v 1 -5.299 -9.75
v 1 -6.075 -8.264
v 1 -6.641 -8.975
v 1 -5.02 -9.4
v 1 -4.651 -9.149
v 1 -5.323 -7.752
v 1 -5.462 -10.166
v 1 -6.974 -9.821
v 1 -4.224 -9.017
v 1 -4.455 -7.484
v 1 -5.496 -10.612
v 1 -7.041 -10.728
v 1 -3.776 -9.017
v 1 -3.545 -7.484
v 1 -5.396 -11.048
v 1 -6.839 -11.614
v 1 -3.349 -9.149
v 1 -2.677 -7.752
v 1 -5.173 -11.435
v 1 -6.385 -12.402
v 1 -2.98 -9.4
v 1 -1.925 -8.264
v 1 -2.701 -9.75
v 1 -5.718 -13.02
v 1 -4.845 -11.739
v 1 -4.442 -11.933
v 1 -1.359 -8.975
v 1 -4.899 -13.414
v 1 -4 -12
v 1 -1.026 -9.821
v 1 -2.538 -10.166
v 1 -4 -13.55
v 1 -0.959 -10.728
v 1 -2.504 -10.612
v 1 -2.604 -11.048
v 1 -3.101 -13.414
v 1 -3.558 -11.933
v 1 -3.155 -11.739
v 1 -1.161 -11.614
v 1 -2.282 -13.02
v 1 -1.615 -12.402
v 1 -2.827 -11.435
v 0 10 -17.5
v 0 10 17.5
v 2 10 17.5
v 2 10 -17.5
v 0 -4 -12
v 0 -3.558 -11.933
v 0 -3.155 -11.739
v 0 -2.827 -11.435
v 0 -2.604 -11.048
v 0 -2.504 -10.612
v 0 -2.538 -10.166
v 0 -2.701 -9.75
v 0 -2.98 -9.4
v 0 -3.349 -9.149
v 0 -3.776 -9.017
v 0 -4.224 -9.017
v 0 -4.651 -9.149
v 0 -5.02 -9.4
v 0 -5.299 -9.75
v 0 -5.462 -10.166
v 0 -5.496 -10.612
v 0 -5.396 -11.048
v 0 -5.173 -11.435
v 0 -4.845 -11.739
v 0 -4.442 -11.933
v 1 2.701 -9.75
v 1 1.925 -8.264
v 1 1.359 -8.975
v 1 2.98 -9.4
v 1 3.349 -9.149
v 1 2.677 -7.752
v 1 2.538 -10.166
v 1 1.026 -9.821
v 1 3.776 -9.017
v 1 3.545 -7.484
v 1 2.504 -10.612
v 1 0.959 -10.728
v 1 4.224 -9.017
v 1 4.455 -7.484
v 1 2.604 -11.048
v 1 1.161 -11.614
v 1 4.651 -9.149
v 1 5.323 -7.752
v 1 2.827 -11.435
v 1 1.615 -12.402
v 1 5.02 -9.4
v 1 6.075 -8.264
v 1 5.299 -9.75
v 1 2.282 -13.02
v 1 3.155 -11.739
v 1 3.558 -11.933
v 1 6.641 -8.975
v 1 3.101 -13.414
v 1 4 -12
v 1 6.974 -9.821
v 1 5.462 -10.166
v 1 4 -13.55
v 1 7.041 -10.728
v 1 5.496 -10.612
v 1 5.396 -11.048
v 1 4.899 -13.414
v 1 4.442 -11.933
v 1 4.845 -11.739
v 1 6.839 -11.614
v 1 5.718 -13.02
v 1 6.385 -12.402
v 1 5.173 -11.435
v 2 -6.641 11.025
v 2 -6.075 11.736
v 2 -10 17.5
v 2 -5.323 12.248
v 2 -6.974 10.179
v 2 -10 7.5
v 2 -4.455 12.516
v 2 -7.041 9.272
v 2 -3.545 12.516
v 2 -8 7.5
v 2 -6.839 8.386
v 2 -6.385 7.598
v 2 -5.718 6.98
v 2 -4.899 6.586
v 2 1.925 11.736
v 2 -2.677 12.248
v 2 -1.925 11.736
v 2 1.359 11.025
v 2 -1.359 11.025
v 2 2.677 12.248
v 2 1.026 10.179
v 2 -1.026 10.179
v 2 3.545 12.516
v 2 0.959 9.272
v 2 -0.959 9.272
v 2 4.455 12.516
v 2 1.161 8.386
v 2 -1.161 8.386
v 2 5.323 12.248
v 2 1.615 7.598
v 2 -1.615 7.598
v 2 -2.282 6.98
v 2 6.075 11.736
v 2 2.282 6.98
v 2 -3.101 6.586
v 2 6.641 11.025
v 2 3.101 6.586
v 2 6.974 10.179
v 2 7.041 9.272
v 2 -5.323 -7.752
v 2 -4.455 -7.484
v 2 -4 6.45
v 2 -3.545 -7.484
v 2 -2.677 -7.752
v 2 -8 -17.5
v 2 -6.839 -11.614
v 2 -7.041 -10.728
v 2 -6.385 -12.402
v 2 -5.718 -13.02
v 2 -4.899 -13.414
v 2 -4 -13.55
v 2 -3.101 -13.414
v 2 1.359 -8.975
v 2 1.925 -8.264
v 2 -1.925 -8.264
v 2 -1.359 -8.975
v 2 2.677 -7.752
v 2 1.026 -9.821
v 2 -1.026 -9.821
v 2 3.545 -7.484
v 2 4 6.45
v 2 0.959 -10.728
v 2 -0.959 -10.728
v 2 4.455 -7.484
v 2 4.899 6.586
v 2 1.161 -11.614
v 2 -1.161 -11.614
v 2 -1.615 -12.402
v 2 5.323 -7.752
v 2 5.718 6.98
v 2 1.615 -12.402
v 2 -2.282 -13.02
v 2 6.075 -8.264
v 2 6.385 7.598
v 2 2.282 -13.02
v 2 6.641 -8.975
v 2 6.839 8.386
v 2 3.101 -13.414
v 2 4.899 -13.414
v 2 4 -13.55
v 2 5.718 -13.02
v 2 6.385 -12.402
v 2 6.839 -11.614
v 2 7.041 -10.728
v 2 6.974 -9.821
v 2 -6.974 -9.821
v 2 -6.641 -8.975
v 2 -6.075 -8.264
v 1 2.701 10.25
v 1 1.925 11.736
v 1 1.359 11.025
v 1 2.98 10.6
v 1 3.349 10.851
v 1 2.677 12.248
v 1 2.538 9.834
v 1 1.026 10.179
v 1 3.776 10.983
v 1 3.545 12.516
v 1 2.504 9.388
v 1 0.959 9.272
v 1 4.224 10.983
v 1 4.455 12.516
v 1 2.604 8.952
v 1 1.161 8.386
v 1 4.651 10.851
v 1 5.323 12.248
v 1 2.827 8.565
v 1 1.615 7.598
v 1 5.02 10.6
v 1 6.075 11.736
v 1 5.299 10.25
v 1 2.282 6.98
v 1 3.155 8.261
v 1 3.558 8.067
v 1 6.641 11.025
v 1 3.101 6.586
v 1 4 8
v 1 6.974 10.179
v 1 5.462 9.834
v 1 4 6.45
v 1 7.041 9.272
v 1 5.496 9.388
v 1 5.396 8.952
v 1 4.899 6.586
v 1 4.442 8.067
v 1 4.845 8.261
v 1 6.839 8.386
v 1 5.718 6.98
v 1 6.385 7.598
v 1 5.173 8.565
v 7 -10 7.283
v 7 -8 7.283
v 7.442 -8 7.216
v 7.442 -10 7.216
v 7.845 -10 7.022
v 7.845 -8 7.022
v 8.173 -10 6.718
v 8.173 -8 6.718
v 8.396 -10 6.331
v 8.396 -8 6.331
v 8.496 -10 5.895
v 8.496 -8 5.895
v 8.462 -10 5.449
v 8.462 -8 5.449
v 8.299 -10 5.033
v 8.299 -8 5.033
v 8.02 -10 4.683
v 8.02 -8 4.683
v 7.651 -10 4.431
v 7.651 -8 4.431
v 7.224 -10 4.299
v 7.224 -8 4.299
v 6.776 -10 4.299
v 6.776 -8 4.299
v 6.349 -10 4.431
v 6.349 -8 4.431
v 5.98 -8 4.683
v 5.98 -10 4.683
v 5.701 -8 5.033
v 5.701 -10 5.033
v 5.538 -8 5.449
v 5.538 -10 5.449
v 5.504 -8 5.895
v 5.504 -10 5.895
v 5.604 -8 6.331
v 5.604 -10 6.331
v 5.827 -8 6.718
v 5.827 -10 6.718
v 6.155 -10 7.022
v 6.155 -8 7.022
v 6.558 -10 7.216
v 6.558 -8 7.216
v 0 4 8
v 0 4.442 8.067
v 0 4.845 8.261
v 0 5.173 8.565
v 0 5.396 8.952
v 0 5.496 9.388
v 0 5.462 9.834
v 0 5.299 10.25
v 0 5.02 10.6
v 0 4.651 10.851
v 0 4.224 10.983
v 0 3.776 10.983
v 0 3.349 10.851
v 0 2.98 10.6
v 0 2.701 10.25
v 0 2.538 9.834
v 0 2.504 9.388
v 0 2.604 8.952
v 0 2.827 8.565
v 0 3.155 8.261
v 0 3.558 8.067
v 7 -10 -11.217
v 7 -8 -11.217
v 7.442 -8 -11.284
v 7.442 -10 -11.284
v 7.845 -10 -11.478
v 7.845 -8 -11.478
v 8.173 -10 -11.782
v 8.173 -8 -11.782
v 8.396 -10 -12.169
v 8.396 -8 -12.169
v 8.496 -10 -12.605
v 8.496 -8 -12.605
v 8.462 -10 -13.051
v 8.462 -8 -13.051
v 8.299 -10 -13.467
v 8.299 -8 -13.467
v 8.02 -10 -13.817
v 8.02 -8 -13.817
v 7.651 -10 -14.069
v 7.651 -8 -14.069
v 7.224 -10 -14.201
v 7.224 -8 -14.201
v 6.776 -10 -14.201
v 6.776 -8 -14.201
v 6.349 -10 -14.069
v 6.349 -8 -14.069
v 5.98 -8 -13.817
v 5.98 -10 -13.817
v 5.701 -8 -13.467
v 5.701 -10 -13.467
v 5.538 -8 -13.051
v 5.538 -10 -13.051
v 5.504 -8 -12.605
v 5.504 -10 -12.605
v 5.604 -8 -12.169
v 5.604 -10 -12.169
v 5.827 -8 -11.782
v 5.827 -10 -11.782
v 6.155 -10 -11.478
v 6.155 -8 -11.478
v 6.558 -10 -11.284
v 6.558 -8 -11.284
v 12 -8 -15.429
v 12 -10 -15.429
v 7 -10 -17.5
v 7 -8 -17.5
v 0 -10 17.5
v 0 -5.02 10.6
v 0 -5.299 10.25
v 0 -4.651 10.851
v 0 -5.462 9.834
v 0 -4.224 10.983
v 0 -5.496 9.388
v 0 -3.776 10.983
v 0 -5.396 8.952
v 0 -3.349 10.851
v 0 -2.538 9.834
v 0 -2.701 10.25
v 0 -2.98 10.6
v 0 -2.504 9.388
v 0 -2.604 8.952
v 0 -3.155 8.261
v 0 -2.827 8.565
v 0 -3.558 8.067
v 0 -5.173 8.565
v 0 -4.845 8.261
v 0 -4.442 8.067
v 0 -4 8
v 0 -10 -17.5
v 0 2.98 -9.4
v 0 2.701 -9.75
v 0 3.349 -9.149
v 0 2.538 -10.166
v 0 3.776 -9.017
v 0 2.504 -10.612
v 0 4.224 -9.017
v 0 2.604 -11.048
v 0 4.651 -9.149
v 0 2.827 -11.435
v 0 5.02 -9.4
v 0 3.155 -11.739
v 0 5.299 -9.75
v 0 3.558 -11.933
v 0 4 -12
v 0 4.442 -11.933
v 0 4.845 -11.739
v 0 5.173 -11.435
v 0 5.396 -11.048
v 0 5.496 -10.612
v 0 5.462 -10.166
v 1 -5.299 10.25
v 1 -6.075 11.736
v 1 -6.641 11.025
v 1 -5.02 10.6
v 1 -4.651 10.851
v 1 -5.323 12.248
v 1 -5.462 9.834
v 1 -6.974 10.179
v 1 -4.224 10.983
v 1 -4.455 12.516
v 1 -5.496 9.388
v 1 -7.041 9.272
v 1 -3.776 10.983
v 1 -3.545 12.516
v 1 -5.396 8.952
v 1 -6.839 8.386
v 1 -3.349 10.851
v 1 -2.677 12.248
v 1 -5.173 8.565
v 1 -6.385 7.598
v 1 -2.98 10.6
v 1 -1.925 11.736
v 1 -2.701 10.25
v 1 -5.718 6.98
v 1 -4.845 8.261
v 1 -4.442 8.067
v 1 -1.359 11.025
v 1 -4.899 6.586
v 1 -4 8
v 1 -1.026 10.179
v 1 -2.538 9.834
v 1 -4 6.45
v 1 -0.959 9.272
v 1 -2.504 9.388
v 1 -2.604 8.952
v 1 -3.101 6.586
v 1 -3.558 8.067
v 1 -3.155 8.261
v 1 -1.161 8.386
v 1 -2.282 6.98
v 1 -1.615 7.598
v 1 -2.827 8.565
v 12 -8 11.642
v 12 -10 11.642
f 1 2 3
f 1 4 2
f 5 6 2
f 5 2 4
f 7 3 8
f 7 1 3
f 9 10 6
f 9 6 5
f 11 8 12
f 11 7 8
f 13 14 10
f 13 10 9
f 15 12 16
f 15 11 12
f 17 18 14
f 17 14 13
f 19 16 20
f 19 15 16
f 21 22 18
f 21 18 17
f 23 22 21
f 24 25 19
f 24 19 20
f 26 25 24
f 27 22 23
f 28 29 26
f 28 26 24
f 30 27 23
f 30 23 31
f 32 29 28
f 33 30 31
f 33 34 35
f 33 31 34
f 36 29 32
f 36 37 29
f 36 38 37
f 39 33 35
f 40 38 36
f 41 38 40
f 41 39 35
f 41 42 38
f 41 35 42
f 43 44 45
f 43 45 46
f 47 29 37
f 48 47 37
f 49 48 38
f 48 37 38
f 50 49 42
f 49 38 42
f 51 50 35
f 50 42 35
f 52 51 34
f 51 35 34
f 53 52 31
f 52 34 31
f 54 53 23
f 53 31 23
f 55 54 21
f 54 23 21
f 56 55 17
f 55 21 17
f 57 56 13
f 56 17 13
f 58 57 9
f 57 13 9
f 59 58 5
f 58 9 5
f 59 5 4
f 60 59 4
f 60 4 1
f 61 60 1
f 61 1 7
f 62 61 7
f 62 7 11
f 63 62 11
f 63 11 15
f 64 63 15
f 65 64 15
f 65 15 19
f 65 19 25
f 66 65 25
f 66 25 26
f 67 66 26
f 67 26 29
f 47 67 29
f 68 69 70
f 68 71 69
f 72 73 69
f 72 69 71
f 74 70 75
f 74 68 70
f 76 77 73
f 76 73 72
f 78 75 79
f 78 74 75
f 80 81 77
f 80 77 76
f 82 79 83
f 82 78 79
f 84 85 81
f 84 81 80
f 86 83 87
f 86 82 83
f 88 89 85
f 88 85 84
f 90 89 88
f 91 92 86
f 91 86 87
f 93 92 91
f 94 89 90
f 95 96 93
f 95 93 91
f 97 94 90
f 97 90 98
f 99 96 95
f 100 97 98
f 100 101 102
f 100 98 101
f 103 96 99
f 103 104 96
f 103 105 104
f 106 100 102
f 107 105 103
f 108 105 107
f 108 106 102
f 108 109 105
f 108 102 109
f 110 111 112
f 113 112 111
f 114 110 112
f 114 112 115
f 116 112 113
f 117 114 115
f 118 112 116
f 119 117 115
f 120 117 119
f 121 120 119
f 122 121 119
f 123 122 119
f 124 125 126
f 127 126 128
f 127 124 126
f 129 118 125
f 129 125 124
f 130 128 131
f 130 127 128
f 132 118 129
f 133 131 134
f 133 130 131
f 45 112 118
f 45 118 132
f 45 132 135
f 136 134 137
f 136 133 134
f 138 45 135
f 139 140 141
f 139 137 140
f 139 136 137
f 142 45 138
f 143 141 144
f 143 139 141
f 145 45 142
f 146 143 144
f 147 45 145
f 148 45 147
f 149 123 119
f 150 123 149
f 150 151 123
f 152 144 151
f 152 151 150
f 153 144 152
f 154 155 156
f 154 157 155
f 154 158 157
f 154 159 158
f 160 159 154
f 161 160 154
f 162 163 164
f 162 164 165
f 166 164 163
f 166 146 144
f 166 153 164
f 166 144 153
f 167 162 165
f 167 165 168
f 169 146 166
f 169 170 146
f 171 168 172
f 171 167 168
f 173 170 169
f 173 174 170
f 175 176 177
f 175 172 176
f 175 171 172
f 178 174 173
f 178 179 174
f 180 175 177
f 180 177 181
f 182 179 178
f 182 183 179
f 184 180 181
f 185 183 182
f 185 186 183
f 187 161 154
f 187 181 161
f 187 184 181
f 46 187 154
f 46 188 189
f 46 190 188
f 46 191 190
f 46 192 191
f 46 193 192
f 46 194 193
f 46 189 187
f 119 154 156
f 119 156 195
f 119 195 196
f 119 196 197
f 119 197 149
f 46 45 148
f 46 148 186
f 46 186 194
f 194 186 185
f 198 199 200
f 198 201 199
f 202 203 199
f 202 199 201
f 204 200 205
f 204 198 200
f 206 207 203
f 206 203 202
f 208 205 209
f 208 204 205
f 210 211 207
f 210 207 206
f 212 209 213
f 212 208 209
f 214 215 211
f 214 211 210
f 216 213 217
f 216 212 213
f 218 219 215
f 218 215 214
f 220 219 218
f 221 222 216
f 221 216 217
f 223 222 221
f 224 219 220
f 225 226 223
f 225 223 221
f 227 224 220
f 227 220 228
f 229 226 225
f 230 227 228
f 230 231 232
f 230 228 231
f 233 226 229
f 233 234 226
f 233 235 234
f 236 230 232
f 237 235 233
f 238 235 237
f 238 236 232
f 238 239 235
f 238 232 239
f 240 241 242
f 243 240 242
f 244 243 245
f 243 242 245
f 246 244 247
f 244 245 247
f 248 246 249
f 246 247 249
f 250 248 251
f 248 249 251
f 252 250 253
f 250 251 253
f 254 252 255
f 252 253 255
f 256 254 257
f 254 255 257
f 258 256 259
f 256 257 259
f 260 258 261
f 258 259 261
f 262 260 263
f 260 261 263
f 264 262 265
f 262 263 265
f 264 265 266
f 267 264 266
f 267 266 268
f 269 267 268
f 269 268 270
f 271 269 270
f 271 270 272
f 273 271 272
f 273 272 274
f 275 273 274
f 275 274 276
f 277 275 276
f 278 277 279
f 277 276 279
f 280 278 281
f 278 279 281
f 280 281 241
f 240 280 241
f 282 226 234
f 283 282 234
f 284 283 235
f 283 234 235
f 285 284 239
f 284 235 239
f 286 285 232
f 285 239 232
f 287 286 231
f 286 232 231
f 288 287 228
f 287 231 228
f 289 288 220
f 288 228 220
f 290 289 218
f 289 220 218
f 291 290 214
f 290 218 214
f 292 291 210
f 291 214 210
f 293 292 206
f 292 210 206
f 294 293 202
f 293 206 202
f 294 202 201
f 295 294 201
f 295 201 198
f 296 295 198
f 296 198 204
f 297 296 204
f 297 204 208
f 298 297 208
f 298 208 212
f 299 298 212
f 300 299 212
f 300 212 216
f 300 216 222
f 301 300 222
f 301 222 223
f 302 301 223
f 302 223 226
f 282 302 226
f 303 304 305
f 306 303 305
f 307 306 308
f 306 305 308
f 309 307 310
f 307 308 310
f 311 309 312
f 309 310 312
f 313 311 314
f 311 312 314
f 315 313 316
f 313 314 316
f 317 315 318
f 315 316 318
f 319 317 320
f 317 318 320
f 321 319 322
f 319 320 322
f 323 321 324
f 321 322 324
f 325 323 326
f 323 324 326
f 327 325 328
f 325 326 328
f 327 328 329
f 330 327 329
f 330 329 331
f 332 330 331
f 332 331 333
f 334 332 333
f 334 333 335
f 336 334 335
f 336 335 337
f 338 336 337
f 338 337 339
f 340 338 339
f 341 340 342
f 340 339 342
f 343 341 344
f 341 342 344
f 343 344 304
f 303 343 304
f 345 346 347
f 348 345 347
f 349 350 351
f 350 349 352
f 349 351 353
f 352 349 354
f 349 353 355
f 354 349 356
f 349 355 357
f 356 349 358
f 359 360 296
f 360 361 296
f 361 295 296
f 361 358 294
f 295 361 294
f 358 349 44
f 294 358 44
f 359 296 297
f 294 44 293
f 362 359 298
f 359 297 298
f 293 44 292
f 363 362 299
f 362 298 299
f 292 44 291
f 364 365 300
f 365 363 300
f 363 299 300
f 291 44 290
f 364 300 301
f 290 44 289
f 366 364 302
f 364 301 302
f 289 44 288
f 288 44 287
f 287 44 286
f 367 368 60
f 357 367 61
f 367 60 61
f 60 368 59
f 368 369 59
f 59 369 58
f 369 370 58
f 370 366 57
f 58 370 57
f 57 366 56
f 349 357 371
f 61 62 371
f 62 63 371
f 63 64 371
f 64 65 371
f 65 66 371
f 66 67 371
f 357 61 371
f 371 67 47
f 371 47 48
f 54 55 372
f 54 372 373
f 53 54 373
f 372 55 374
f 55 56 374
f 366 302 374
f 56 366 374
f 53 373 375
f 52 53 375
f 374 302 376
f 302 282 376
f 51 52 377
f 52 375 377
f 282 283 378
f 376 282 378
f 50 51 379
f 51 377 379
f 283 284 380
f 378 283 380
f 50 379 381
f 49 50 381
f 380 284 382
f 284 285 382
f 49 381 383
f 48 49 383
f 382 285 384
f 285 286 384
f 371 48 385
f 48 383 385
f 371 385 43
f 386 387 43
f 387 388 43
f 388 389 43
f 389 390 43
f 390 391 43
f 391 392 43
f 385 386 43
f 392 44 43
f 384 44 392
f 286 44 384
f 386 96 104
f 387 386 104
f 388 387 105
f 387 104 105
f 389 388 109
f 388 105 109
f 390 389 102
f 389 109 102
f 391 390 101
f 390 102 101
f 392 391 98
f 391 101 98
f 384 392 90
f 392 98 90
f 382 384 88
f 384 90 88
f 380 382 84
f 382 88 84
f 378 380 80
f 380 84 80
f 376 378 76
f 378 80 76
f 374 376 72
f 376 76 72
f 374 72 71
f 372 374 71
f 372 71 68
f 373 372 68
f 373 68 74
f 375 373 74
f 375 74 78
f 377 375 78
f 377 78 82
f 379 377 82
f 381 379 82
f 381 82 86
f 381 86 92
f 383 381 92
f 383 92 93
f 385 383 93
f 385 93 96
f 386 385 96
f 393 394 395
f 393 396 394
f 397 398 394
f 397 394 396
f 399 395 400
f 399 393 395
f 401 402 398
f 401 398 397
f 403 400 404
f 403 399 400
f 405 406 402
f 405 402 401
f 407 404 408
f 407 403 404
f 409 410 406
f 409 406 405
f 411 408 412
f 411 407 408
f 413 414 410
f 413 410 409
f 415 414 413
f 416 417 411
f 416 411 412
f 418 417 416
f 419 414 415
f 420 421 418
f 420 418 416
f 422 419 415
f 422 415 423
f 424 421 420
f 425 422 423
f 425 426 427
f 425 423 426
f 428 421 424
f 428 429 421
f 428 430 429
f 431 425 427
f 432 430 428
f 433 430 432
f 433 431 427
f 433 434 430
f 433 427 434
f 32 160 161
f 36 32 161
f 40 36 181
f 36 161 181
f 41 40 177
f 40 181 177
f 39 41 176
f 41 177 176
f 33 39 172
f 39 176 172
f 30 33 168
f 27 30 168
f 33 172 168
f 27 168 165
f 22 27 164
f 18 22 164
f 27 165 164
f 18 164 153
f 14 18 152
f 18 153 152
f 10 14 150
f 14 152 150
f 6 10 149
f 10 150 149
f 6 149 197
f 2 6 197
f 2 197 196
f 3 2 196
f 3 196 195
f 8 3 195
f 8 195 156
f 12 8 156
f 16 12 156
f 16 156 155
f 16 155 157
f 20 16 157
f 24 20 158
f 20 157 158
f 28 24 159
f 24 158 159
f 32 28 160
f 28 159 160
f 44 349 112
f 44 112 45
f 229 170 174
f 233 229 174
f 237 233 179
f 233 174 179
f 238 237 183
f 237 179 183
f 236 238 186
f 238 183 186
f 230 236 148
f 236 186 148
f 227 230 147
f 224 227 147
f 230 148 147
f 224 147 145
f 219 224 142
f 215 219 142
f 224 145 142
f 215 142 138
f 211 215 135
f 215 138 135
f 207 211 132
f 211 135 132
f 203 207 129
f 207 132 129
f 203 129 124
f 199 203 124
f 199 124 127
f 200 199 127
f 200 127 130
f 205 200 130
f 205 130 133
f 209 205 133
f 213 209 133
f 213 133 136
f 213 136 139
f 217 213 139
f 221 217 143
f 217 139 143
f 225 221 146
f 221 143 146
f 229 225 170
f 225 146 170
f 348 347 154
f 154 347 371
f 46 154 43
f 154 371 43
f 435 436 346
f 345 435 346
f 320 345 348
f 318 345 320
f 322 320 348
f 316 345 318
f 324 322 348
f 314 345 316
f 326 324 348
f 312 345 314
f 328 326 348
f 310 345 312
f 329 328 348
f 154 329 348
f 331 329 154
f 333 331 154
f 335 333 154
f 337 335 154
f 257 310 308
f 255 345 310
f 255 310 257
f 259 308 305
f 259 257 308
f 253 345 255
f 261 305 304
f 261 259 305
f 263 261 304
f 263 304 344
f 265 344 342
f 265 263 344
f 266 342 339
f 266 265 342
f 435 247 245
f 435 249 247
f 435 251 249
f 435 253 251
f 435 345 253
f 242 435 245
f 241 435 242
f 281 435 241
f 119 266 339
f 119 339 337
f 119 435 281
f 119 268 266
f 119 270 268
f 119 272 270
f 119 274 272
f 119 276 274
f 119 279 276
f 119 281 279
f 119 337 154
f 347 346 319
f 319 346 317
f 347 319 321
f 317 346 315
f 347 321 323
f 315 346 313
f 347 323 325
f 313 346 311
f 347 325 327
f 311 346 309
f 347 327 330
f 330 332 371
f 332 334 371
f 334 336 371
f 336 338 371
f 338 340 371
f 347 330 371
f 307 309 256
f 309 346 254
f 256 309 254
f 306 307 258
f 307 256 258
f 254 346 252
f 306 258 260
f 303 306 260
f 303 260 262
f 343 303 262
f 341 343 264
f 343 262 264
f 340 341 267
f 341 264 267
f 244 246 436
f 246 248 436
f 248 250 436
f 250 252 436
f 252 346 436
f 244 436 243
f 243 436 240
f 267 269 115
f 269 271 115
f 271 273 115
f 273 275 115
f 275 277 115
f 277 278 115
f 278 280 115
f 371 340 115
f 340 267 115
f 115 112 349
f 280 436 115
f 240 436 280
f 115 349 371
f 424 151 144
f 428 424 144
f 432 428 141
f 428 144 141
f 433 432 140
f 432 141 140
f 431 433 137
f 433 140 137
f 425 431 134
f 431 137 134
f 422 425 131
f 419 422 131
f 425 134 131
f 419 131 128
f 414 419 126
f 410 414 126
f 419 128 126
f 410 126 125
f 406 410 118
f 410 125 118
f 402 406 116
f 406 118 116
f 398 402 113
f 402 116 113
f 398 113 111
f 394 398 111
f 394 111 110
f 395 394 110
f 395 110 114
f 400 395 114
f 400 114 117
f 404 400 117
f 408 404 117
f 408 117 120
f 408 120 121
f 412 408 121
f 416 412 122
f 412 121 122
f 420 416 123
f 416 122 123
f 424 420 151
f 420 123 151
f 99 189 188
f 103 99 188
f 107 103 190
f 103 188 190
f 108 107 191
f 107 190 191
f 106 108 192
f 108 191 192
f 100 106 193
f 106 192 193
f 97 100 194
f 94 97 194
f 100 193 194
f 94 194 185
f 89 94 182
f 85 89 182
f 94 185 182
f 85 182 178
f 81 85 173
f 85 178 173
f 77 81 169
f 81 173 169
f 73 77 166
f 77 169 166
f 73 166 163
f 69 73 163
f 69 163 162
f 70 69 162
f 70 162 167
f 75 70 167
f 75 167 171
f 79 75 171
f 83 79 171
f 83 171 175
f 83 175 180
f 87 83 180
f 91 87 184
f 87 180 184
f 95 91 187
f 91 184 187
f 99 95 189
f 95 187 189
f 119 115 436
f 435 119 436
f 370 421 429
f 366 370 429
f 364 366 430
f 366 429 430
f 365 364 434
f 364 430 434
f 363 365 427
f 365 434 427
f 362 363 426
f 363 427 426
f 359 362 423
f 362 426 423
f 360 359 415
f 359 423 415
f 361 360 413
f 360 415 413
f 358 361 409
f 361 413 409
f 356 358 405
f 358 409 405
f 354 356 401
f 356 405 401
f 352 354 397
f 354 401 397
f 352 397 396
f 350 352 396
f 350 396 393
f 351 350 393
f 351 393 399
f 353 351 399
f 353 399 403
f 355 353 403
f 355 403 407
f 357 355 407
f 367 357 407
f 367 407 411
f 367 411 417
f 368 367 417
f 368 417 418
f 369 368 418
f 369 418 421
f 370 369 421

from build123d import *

# Parameters (mm, degrees)
SKETCH1_W           = 35
SKETCH1_H           = 20
BOSS_EXTRUDE1_DEPTH = 2
SKETCH3_R           = 1.5
CUT_EXTRUDE1_DEPTH  = 2
BOSS_EXTRUDE2_DEPTH = 2
SKETCH5_R           = 1.5
CUT_EXTRUDE2_DEPTH  = 2
SKETCH6_R           = 3.05
CUT_EXTRUDE3_DEPTH  = 1


with BuildPart() as part:
    # Sketch1 → Boss-Extrude1 (new body)
    with BuildSketch(Plane(origin=(0, 0, 0), x_dir=(0, 0, -1), z_dir=(1, 0, 0))):
        Rectangle(SKETCH1_W, SKETCH1_H)
    extrude(amount=BOSS_EXTRUDE1_DEPTH)

    # Sketch3 → Cut-Extrude1 (cut)
    with BuildSketch(Plane(origin=(2, 0, 0), x_dir=(0, 0, -1), z_dir=(1, 0, 0))):
        with Locations((10.5, 4)):
            Circle(SKETCH3_R)
        with Locations((10.5, -4)):
            Circle(SKETCH3_R)
        with Locations((-9.5, 4)):
            Circle(SKETCH3_R)
        with Locations((-9.5, -4)):
            Circle(SKETCH3_R)
    extrude(amount=-CUT_EXTRUDE1_DEPTH, mode=Mode.SUBTRACT)

    # Sketch4 → Boss-Extrude2 (add)
    with BuildSketch(Plane.XZ.offset(10)):
        Polygon((2, 7.5), (12, 11.642135624), (12, -15.428932188), (7, -17.5), (2, -17.5), align=None)
    extrude(amount=-BOSS_EXTRUDE2_DEPTH)

    # Sketch5 → Cut-Extrude2 (cut)
    with BuildSketch(Plane(origin=(0, -8, 0), x_dir=(1, 0, 0), z_dir=(0, 1, 0))):
        with Locations(Location((7, 12.717304889, 0), (0, 0, 270))):
            Circle(SKETCH5_R)
        with Locations(Location((7, -5.782695111, 0), (0, 0, 270))):
            Circle(SKETCH5_R)
    extrude(amount=-CUT_EXTRUDE2_DEPTH, mode=Mode.SUBTRACT)

    # Sketch6 → Cut-Extrude3 (cut)
    with BuildSketch(Plane(origin=(2, 0, 0), x_dir=(0, 0, -1), z_dir=(1, 0, 0))):
        with Locations((-9.5, 4)):
            Circle(SKETCH6_R)
        with Locations((-9.5, -4)):
            Circle(SKETCH6_R)
        with Locations((10.5, -4)):
            Circle(SKETCH6_R)
        with Locations((10.5, 4)):
            Circle(SKETCH6_R)
    extrude(amount=-CUT_EXTRUDE3_DEPTH, mode=Mode.SUBTRACT)


solid = part.part
